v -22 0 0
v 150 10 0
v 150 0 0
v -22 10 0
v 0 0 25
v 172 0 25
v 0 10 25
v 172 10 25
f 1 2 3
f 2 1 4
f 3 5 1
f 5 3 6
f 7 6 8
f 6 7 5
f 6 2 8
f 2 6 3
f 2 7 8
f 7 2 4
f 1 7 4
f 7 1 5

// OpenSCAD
module sidepanel(width,depth,height,skew){
    points = [
    [0-skew,0,0], //0
    [width,0,0], //1
    [width,depth,0], //2
    [0-skew,depth,0],//3
    [0,0,height],//4
    [width+skew,0,height],//5
    [width+skew,depth,height],//6
    [0,depth,height]];//7
    faces = [
    [0,1,2,3],
    [4,5,1,0],
    [7,6,5,4],
    [5,6,2,1],
    [6,7,3,2],
    [7,4,0,3]];
    
    polyhedron(points,faces);
}

//aproximat measurmeents, these are not accurate enough to be usefull since we havent finalised the chassis shape
sidepanel(150,10,25,22);
